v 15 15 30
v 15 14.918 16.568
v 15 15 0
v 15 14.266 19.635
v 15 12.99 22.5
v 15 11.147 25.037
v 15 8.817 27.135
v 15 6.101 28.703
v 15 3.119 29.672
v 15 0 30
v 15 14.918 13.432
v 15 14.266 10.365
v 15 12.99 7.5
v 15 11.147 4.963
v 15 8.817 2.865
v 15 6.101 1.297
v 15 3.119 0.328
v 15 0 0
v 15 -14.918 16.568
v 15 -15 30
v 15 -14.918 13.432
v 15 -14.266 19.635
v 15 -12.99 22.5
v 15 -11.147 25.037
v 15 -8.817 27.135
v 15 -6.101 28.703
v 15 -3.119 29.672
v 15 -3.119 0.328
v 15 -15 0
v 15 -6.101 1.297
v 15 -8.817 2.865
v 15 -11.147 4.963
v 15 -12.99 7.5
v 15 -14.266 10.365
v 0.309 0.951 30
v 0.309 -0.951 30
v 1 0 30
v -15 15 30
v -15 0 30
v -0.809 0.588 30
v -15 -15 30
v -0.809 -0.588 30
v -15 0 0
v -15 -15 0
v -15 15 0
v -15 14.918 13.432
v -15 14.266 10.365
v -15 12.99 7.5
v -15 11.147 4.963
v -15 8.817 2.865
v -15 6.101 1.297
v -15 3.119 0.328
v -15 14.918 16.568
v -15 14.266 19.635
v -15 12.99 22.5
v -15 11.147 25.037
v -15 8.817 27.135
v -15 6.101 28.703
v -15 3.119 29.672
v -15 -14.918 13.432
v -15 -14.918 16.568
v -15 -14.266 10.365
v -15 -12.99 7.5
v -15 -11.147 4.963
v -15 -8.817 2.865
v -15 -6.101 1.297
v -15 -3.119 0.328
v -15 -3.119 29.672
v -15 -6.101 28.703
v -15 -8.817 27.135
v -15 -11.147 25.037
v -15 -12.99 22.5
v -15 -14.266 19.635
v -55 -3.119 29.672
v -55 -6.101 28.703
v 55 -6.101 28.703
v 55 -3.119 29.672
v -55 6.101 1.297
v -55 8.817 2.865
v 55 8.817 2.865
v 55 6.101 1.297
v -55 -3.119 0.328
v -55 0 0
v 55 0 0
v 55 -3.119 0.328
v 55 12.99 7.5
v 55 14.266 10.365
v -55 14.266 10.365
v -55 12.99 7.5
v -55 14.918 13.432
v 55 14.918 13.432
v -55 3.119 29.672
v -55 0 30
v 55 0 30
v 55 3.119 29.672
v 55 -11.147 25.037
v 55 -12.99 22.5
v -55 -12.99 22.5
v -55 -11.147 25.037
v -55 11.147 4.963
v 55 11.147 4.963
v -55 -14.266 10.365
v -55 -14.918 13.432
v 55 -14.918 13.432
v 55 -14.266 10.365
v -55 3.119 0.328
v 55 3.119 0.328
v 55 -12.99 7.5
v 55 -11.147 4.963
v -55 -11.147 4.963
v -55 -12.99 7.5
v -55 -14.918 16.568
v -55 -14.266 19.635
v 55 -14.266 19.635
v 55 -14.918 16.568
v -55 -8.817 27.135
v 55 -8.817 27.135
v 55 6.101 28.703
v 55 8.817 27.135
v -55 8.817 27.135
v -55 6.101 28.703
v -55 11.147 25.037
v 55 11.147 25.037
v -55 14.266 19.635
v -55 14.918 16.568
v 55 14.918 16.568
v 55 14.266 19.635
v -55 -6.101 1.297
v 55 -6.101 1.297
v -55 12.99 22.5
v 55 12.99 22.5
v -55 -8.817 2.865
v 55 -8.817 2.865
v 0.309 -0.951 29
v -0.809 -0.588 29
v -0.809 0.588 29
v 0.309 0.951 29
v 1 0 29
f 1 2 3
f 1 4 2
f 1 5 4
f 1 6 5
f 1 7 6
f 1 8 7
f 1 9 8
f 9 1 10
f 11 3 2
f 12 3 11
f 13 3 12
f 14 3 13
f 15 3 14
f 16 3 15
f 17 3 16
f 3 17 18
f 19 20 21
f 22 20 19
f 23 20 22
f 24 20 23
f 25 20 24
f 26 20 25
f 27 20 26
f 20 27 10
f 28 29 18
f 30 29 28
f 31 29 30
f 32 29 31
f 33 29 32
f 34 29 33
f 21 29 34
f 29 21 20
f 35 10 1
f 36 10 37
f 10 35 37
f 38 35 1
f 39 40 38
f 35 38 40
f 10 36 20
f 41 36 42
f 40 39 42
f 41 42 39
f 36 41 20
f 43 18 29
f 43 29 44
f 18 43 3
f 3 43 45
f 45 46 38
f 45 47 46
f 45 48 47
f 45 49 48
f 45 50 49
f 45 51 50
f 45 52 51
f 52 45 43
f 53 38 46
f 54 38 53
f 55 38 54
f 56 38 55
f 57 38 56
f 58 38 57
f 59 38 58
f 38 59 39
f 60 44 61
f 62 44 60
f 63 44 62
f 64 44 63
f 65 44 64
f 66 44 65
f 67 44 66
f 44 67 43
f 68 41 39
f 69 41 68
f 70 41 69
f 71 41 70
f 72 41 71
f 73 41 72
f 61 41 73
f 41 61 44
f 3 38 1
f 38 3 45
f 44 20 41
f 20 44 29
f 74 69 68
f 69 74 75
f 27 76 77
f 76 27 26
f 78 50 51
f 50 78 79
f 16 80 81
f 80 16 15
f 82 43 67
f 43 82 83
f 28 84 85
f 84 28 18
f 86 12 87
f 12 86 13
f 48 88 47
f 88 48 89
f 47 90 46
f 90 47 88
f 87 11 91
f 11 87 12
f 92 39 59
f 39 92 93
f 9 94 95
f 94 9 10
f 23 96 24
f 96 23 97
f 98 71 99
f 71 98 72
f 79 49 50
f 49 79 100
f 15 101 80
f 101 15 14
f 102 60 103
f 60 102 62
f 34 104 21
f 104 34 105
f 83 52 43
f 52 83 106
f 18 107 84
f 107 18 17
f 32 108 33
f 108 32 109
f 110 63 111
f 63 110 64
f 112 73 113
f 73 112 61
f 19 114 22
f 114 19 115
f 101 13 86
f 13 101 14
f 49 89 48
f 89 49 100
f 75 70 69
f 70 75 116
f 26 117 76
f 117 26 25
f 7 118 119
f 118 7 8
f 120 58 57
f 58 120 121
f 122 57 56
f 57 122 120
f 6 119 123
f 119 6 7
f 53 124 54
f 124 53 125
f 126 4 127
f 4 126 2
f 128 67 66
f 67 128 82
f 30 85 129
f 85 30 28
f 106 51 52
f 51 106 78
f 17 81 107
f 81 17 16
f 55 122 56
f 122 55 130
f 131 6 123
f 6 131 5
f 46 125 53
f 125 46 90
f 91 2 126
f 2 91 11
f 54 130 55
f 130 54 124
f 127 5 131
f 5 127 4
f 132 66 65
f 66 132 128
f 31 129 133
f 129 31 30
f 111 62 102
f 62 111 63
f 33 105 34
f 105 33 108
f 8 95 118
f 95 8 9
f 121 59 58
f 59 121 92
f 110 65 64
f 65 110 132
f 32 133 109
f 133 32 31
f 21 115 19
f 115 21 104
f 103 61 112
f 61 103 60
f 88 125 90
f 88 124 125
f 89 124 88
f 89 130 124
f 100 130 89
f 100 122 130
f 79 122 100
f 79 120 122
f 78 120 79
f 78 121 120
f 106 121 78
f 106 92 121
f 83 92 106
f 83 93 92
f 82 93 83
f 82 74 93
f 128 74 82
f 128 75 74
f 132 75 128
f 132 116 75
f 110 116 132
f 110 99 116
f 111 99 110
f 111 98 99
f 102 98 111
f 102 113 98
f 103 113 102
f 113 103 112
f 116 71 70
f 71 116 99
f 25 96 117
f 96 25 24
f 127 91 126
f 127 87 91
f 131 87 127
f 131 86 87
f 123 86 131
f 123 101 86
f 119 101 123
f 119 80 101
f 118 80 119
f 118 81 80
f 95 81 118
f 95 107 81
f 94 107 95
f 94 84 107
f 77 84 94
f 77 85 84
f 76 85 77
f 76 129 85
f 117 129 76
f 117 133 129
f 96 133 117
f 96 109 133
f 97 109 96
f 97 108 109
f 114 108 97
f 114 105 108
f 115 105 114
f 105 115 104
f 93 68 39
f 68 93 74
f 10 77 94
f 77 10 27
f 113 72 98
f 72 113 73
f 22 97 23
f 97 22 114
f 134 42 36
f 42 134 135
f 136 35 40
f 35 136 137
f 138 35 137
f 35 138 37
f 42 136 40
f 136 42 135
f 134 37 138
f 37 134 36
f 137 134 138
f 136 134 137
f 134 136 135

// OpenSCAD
cube_size = 30; // [10:Small,20:Medium,30:Large]

hole_diameter = 2; 
hole_radius = hole_diameter/2;

// How deep should the center hole be?
hole_depth = 1; // [0,1,5,50]

show_wheels = "yes"; // [yes,no]

// How thick should the side wheels be?
wheel_thickness = 40; // [1:40]

// ignore this variable!
// foo=1;

// don't turn functions into params!
function BEZ03(u) = pow((1-u), 3);

// ignore variable values
bing = 3+4;
baz = 3 / hole_depth;

difference() {
  union() {
    translate([0, 0, cube_size/2]) cube([cube_size,cube_size,cube_size], center=true);
    if (show_wheels == "yes") {
      translate([0, 0, cube_size/2]) rotate([0, 90, 0]) {
        cylinder(r=cube_size/2, h=cube_size+(wheel_thickness*2), center=true);
      }
    }
  }
  translate([0, 0, cube_size-hole_depth]) cylinder(r=hole_radius, h=hole_depth);
}
        
